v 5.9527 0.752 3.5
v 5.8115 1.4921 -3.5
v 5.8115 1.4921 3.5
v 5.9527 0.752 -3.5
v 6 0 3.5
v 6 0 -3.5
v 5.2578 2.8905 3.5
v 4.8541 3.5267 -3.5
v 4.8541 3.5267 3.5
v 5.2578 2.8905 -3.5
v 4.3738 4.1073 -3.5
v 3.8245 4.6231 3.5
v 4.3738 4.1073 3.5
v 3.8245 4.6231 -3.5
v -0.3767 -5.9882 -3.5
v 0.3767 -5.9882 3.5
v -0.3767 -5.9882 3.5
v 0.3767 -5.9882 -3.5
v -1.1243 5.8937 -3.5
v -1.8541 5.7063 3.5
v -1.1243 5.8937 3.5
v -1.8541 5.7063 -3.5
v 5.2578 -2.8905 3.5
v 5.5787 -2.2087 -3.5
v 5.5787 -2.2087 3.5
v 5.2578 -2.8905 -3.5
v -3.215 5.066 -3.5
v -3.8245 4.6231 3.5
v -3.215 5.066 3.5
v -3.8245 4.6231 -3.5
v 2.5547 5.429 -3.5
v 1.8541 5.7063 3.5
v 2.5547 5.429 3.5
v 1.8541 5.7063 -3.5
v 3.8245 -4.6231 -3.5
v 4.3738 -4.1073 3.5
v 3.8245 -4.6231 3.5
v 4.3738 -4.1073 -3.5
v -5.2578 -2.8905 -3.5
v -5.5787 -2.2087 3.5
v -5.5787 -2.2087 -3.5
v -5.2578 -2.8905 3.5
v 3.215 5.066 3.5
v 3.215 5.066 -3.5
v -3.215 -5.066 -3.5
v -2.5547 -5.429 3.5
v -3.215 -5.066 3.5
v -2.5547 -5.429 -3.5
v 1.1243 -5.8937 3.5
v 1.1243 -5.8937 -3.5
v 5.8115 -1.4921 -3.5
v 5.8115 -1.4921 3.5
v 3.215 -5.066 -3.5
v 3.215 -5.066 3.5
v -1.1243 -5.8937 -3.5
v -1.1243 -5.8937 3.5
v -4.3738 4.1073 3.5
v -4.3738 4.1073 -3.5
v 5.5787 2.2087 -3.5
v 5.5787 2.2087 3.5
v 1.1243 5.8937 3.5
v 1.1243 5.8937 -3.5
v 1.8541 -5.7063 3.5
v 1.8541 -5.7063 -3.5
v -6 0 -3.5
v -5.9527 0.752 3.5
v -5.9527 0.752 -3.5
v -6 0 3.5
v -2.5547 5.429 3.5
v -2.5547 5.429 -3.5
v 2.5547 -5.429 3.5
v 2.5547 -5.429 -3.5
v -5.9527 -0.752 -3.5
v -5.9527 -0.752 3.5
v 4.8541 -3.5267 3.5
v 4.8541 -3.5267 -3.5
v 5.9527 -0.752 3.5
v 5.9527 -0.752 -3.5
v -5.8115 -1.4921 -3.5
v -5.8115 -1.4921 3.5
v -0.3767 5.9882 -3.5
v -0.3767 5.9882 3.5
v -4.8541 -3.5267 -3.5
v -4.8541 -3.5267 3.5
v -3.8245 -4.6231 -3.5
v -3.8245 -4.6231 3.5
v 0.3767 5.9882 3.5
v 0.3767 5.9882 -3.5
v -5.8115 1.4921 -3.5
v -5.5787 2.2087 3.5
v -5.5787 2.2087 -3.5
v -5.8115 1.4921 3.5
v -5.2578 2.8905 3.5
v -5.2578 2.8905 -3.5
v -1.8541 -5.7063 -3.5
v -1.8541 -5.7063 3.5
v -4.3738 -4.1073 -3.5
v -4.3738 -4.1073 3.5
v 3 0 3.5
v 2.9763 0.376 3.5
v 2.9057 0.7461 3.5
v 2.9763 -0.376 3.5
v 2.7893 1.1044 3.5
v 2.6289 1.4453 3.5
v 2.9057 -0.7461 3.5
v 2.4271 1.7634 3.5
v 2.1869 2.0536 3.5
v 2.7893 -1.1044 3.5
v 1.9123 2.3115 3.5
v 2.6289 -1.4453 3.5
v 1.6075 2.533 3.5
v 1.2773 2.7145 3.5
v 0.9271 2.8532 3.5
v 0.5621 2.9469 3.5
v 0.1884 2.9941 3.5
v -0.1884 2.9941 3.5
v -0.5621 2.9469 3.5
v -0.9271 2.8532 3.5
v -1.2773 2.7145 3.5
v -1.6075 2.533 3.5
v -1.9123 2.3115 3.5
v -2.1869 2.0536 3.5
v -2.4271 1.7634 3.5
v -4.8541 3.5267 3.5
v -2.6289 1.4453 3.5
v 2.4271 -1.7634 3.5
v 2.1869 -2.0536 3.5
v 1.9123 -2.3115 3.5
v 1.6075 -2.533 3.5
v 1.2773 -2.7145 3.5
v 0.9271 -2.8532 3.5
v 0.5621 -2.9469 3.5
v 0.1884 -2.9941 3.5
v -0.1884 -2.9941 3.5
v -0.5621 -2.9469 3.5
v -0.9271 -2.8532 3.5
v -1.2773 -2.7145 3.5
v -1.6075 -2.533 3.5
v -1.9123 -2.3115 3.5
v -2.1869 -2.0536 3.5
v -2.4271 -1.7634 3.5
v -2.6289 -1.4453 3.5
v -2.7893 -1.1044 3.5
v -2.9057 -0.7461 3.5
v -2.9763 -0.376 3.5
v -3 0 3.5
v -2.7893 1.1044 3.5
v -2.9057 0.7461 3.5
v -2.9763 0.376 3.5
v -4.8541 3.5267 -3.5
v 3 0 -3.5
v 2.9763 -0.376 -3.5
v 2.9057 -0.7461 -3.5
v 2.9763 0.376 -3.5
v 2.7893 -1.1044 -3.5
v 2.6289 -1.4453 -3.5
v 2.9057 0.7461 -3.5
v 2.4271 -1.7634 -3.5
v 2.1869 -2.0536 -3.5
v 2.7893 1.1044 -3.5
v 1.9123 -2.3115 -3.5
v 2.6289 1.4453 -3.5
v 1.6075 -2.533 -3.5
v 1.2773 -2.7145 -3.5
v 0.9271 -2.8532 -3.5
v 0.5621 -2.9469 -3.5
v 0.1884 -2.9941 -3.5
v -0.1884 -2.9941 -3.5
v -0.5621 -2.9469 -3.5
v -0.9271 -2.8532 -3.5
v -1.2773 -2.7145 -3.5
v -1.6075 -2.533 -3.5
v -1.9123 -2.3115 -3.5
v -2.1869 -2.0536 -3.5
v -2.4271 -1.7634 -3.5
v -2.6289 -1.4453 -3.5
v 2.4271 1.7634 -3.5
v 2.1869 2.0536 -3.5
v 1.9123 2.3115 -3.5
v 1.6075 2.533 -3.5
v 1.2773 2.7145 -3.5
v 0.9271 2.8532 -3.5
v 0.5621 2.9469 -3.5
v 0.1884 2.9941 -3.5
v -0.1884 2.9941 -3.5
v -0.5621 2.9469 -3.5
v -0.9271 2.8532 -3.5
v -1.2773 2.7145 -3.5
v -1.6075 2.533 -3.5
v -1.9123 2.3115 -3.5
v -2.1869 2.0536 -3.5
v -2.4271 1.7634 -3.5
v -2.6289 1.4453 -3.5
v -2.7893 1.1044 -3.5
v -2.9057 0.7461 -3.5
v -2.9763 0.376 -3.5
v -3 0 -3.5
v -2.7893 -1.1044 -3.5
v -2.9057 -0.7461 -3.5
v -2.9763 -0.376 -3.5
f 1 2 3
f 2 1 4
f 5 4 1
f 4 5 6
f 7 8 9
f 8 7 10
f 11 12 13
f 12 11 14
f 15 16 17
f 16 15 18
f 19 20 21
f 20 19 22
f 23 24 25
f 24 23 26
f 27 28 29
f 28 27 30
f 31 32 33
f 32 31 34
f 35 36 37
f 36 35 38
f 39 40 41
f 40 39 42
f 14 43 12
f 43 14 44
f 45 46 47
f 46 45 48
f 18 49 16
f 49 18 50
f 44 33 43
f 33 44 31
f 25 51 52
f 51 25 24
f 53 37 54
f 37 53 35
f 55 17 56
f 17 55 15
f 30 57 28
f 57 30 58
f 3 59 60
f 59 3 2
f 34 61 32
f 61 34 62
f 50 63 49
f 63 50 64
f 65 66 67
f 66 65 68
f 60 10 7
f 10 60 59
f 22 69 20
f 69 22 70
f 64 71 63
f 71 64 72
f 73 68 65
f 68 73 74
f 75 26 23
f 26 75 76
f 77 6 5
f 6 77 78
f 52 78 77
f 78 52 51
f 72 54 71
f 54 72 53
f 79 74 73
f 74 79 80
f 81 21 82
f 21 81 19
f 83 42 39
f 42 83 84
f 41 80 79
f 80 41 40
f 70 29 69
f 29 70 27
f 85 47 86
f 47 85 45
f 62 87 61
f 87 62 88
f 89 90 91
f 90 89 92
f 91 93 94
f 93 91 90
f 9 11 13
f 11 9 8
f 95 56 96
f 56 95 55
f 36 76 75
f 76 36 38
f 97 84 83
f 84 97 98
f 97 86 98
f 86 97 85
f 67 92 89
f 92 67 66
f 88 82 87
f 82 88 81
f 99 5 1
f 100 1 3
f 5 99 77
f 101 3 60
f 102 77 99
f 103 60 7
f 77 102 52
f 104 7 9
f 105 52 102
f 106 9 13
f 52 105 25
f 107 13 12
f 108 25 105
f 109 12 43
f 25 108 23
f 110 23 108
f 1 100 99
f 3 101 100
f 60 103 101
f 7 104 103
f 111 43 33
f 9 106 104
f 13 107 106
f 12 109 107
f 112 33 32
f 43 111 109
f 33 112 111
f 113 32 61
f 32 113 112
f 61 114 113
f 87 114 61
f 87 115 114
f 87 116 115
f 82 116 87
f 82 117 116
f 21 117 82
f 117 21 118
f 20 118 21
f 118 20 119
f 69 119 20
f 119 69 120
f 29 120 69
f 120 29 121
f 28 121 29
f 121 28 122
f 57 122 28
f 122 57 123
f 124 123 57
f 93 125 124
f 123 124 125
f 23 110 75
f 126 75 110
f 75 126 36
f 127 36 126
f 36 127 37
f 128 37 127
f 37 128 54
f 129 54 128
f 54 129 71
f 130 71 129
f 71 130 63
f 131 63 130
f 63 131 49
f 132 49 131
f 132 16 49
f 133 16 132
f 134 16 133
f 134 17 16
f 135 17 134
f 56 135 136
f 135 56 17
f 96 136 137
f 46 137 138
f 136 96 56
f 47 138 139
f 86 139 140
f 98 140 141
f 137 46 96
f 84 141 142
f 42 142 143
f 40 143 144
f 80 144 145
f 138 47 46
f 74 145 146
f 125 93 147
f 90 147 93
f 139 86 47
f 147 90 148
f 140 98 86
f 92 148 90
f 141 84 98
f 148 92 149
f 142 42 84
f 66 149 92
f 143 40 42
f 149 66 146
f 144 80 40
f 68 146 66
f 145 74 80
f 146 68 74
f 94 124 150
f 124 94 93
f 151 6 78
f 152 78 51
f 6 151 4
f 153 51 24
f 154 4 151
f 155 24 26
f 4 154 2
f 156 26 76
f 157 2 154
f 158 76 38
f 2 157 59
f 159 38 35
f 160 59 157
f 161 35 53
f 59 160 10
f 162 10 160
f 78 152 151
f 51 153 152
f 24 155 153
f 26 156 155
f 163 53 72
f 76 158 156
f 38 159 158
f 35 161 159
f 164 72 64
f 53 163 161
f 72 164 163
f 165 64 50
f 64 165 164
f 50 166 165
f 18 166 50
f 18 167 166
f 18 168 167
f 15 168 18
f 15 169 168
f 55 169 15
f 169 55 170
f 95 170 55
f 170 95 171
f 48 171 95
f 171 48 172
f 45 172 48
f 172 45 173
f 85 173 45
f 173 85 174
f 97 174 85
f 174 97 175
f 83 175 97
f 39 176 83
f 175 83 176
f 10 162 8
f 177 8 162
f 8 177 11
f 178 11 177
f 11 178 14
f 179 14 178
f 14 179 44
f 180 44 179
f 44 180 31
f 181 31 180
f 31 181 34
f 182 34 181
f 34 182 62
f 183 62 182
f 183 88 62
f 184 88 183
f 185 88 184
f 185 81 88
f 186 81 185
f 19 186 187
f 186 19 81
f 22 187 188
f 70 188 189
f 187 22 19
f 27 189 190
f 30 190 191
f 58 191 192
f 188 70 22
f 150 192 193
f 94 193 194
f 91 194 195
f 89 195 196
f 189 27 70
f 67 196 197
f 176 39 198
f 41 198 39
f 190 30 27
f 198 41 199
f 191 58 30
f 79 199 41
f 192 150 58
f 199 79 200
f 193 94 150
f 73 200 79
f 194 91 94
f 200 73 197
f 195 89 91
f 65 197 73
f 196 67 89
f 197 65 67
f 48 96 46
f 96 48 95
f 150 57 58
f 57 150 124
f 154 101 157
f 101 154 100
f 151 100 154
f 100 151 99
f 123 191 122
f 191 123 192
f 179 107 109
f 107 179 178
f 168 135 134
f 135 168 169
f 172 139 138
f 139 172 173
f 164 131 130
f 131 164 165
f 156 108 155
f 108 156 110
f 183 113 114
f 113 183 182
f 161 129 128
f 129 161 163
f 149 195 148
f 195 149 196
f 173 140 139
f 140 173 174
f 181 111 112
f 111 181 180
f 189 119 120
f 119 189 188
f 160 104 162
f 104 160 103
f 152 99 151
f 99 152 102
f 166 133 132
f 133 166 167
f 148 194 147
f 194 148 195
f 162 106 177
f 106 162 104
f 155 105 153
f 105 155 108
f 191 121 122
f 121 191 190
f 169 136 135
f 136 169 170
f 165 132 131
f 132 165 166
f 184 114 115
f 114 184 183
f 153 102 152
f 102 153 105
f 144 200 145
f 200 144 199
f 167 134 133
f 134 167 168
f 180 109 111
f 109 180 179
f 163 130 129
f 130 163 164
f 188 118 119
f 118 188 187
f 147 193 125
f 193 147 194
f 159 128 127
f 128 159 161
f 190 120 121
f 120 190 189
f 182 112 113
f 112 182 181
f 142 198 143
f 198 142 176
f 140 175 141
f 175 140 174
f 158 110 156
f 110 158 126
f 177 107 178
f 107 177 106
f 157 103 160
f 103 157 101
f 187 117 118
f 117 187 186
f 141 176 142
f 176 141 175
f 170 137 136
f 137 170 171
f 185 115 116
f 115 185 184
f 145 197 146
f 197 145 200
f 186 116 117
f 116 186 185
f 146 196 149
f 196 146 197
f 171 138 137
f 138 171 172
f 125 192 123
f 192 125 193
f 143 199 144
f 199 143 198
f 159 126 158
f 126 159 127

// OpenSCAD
$fn = 50;


difference() {
	union() {
		translate(v = [0, 0, -3.5000000000]) {
			cylinder(h = 7, r = 6.0000000000);
		}
	}
	union() {
		translate(v = [0, 0, -100.0000000000]) {
			cylinder(h = 200, r = 3.0000000000);
		}
	}
}
